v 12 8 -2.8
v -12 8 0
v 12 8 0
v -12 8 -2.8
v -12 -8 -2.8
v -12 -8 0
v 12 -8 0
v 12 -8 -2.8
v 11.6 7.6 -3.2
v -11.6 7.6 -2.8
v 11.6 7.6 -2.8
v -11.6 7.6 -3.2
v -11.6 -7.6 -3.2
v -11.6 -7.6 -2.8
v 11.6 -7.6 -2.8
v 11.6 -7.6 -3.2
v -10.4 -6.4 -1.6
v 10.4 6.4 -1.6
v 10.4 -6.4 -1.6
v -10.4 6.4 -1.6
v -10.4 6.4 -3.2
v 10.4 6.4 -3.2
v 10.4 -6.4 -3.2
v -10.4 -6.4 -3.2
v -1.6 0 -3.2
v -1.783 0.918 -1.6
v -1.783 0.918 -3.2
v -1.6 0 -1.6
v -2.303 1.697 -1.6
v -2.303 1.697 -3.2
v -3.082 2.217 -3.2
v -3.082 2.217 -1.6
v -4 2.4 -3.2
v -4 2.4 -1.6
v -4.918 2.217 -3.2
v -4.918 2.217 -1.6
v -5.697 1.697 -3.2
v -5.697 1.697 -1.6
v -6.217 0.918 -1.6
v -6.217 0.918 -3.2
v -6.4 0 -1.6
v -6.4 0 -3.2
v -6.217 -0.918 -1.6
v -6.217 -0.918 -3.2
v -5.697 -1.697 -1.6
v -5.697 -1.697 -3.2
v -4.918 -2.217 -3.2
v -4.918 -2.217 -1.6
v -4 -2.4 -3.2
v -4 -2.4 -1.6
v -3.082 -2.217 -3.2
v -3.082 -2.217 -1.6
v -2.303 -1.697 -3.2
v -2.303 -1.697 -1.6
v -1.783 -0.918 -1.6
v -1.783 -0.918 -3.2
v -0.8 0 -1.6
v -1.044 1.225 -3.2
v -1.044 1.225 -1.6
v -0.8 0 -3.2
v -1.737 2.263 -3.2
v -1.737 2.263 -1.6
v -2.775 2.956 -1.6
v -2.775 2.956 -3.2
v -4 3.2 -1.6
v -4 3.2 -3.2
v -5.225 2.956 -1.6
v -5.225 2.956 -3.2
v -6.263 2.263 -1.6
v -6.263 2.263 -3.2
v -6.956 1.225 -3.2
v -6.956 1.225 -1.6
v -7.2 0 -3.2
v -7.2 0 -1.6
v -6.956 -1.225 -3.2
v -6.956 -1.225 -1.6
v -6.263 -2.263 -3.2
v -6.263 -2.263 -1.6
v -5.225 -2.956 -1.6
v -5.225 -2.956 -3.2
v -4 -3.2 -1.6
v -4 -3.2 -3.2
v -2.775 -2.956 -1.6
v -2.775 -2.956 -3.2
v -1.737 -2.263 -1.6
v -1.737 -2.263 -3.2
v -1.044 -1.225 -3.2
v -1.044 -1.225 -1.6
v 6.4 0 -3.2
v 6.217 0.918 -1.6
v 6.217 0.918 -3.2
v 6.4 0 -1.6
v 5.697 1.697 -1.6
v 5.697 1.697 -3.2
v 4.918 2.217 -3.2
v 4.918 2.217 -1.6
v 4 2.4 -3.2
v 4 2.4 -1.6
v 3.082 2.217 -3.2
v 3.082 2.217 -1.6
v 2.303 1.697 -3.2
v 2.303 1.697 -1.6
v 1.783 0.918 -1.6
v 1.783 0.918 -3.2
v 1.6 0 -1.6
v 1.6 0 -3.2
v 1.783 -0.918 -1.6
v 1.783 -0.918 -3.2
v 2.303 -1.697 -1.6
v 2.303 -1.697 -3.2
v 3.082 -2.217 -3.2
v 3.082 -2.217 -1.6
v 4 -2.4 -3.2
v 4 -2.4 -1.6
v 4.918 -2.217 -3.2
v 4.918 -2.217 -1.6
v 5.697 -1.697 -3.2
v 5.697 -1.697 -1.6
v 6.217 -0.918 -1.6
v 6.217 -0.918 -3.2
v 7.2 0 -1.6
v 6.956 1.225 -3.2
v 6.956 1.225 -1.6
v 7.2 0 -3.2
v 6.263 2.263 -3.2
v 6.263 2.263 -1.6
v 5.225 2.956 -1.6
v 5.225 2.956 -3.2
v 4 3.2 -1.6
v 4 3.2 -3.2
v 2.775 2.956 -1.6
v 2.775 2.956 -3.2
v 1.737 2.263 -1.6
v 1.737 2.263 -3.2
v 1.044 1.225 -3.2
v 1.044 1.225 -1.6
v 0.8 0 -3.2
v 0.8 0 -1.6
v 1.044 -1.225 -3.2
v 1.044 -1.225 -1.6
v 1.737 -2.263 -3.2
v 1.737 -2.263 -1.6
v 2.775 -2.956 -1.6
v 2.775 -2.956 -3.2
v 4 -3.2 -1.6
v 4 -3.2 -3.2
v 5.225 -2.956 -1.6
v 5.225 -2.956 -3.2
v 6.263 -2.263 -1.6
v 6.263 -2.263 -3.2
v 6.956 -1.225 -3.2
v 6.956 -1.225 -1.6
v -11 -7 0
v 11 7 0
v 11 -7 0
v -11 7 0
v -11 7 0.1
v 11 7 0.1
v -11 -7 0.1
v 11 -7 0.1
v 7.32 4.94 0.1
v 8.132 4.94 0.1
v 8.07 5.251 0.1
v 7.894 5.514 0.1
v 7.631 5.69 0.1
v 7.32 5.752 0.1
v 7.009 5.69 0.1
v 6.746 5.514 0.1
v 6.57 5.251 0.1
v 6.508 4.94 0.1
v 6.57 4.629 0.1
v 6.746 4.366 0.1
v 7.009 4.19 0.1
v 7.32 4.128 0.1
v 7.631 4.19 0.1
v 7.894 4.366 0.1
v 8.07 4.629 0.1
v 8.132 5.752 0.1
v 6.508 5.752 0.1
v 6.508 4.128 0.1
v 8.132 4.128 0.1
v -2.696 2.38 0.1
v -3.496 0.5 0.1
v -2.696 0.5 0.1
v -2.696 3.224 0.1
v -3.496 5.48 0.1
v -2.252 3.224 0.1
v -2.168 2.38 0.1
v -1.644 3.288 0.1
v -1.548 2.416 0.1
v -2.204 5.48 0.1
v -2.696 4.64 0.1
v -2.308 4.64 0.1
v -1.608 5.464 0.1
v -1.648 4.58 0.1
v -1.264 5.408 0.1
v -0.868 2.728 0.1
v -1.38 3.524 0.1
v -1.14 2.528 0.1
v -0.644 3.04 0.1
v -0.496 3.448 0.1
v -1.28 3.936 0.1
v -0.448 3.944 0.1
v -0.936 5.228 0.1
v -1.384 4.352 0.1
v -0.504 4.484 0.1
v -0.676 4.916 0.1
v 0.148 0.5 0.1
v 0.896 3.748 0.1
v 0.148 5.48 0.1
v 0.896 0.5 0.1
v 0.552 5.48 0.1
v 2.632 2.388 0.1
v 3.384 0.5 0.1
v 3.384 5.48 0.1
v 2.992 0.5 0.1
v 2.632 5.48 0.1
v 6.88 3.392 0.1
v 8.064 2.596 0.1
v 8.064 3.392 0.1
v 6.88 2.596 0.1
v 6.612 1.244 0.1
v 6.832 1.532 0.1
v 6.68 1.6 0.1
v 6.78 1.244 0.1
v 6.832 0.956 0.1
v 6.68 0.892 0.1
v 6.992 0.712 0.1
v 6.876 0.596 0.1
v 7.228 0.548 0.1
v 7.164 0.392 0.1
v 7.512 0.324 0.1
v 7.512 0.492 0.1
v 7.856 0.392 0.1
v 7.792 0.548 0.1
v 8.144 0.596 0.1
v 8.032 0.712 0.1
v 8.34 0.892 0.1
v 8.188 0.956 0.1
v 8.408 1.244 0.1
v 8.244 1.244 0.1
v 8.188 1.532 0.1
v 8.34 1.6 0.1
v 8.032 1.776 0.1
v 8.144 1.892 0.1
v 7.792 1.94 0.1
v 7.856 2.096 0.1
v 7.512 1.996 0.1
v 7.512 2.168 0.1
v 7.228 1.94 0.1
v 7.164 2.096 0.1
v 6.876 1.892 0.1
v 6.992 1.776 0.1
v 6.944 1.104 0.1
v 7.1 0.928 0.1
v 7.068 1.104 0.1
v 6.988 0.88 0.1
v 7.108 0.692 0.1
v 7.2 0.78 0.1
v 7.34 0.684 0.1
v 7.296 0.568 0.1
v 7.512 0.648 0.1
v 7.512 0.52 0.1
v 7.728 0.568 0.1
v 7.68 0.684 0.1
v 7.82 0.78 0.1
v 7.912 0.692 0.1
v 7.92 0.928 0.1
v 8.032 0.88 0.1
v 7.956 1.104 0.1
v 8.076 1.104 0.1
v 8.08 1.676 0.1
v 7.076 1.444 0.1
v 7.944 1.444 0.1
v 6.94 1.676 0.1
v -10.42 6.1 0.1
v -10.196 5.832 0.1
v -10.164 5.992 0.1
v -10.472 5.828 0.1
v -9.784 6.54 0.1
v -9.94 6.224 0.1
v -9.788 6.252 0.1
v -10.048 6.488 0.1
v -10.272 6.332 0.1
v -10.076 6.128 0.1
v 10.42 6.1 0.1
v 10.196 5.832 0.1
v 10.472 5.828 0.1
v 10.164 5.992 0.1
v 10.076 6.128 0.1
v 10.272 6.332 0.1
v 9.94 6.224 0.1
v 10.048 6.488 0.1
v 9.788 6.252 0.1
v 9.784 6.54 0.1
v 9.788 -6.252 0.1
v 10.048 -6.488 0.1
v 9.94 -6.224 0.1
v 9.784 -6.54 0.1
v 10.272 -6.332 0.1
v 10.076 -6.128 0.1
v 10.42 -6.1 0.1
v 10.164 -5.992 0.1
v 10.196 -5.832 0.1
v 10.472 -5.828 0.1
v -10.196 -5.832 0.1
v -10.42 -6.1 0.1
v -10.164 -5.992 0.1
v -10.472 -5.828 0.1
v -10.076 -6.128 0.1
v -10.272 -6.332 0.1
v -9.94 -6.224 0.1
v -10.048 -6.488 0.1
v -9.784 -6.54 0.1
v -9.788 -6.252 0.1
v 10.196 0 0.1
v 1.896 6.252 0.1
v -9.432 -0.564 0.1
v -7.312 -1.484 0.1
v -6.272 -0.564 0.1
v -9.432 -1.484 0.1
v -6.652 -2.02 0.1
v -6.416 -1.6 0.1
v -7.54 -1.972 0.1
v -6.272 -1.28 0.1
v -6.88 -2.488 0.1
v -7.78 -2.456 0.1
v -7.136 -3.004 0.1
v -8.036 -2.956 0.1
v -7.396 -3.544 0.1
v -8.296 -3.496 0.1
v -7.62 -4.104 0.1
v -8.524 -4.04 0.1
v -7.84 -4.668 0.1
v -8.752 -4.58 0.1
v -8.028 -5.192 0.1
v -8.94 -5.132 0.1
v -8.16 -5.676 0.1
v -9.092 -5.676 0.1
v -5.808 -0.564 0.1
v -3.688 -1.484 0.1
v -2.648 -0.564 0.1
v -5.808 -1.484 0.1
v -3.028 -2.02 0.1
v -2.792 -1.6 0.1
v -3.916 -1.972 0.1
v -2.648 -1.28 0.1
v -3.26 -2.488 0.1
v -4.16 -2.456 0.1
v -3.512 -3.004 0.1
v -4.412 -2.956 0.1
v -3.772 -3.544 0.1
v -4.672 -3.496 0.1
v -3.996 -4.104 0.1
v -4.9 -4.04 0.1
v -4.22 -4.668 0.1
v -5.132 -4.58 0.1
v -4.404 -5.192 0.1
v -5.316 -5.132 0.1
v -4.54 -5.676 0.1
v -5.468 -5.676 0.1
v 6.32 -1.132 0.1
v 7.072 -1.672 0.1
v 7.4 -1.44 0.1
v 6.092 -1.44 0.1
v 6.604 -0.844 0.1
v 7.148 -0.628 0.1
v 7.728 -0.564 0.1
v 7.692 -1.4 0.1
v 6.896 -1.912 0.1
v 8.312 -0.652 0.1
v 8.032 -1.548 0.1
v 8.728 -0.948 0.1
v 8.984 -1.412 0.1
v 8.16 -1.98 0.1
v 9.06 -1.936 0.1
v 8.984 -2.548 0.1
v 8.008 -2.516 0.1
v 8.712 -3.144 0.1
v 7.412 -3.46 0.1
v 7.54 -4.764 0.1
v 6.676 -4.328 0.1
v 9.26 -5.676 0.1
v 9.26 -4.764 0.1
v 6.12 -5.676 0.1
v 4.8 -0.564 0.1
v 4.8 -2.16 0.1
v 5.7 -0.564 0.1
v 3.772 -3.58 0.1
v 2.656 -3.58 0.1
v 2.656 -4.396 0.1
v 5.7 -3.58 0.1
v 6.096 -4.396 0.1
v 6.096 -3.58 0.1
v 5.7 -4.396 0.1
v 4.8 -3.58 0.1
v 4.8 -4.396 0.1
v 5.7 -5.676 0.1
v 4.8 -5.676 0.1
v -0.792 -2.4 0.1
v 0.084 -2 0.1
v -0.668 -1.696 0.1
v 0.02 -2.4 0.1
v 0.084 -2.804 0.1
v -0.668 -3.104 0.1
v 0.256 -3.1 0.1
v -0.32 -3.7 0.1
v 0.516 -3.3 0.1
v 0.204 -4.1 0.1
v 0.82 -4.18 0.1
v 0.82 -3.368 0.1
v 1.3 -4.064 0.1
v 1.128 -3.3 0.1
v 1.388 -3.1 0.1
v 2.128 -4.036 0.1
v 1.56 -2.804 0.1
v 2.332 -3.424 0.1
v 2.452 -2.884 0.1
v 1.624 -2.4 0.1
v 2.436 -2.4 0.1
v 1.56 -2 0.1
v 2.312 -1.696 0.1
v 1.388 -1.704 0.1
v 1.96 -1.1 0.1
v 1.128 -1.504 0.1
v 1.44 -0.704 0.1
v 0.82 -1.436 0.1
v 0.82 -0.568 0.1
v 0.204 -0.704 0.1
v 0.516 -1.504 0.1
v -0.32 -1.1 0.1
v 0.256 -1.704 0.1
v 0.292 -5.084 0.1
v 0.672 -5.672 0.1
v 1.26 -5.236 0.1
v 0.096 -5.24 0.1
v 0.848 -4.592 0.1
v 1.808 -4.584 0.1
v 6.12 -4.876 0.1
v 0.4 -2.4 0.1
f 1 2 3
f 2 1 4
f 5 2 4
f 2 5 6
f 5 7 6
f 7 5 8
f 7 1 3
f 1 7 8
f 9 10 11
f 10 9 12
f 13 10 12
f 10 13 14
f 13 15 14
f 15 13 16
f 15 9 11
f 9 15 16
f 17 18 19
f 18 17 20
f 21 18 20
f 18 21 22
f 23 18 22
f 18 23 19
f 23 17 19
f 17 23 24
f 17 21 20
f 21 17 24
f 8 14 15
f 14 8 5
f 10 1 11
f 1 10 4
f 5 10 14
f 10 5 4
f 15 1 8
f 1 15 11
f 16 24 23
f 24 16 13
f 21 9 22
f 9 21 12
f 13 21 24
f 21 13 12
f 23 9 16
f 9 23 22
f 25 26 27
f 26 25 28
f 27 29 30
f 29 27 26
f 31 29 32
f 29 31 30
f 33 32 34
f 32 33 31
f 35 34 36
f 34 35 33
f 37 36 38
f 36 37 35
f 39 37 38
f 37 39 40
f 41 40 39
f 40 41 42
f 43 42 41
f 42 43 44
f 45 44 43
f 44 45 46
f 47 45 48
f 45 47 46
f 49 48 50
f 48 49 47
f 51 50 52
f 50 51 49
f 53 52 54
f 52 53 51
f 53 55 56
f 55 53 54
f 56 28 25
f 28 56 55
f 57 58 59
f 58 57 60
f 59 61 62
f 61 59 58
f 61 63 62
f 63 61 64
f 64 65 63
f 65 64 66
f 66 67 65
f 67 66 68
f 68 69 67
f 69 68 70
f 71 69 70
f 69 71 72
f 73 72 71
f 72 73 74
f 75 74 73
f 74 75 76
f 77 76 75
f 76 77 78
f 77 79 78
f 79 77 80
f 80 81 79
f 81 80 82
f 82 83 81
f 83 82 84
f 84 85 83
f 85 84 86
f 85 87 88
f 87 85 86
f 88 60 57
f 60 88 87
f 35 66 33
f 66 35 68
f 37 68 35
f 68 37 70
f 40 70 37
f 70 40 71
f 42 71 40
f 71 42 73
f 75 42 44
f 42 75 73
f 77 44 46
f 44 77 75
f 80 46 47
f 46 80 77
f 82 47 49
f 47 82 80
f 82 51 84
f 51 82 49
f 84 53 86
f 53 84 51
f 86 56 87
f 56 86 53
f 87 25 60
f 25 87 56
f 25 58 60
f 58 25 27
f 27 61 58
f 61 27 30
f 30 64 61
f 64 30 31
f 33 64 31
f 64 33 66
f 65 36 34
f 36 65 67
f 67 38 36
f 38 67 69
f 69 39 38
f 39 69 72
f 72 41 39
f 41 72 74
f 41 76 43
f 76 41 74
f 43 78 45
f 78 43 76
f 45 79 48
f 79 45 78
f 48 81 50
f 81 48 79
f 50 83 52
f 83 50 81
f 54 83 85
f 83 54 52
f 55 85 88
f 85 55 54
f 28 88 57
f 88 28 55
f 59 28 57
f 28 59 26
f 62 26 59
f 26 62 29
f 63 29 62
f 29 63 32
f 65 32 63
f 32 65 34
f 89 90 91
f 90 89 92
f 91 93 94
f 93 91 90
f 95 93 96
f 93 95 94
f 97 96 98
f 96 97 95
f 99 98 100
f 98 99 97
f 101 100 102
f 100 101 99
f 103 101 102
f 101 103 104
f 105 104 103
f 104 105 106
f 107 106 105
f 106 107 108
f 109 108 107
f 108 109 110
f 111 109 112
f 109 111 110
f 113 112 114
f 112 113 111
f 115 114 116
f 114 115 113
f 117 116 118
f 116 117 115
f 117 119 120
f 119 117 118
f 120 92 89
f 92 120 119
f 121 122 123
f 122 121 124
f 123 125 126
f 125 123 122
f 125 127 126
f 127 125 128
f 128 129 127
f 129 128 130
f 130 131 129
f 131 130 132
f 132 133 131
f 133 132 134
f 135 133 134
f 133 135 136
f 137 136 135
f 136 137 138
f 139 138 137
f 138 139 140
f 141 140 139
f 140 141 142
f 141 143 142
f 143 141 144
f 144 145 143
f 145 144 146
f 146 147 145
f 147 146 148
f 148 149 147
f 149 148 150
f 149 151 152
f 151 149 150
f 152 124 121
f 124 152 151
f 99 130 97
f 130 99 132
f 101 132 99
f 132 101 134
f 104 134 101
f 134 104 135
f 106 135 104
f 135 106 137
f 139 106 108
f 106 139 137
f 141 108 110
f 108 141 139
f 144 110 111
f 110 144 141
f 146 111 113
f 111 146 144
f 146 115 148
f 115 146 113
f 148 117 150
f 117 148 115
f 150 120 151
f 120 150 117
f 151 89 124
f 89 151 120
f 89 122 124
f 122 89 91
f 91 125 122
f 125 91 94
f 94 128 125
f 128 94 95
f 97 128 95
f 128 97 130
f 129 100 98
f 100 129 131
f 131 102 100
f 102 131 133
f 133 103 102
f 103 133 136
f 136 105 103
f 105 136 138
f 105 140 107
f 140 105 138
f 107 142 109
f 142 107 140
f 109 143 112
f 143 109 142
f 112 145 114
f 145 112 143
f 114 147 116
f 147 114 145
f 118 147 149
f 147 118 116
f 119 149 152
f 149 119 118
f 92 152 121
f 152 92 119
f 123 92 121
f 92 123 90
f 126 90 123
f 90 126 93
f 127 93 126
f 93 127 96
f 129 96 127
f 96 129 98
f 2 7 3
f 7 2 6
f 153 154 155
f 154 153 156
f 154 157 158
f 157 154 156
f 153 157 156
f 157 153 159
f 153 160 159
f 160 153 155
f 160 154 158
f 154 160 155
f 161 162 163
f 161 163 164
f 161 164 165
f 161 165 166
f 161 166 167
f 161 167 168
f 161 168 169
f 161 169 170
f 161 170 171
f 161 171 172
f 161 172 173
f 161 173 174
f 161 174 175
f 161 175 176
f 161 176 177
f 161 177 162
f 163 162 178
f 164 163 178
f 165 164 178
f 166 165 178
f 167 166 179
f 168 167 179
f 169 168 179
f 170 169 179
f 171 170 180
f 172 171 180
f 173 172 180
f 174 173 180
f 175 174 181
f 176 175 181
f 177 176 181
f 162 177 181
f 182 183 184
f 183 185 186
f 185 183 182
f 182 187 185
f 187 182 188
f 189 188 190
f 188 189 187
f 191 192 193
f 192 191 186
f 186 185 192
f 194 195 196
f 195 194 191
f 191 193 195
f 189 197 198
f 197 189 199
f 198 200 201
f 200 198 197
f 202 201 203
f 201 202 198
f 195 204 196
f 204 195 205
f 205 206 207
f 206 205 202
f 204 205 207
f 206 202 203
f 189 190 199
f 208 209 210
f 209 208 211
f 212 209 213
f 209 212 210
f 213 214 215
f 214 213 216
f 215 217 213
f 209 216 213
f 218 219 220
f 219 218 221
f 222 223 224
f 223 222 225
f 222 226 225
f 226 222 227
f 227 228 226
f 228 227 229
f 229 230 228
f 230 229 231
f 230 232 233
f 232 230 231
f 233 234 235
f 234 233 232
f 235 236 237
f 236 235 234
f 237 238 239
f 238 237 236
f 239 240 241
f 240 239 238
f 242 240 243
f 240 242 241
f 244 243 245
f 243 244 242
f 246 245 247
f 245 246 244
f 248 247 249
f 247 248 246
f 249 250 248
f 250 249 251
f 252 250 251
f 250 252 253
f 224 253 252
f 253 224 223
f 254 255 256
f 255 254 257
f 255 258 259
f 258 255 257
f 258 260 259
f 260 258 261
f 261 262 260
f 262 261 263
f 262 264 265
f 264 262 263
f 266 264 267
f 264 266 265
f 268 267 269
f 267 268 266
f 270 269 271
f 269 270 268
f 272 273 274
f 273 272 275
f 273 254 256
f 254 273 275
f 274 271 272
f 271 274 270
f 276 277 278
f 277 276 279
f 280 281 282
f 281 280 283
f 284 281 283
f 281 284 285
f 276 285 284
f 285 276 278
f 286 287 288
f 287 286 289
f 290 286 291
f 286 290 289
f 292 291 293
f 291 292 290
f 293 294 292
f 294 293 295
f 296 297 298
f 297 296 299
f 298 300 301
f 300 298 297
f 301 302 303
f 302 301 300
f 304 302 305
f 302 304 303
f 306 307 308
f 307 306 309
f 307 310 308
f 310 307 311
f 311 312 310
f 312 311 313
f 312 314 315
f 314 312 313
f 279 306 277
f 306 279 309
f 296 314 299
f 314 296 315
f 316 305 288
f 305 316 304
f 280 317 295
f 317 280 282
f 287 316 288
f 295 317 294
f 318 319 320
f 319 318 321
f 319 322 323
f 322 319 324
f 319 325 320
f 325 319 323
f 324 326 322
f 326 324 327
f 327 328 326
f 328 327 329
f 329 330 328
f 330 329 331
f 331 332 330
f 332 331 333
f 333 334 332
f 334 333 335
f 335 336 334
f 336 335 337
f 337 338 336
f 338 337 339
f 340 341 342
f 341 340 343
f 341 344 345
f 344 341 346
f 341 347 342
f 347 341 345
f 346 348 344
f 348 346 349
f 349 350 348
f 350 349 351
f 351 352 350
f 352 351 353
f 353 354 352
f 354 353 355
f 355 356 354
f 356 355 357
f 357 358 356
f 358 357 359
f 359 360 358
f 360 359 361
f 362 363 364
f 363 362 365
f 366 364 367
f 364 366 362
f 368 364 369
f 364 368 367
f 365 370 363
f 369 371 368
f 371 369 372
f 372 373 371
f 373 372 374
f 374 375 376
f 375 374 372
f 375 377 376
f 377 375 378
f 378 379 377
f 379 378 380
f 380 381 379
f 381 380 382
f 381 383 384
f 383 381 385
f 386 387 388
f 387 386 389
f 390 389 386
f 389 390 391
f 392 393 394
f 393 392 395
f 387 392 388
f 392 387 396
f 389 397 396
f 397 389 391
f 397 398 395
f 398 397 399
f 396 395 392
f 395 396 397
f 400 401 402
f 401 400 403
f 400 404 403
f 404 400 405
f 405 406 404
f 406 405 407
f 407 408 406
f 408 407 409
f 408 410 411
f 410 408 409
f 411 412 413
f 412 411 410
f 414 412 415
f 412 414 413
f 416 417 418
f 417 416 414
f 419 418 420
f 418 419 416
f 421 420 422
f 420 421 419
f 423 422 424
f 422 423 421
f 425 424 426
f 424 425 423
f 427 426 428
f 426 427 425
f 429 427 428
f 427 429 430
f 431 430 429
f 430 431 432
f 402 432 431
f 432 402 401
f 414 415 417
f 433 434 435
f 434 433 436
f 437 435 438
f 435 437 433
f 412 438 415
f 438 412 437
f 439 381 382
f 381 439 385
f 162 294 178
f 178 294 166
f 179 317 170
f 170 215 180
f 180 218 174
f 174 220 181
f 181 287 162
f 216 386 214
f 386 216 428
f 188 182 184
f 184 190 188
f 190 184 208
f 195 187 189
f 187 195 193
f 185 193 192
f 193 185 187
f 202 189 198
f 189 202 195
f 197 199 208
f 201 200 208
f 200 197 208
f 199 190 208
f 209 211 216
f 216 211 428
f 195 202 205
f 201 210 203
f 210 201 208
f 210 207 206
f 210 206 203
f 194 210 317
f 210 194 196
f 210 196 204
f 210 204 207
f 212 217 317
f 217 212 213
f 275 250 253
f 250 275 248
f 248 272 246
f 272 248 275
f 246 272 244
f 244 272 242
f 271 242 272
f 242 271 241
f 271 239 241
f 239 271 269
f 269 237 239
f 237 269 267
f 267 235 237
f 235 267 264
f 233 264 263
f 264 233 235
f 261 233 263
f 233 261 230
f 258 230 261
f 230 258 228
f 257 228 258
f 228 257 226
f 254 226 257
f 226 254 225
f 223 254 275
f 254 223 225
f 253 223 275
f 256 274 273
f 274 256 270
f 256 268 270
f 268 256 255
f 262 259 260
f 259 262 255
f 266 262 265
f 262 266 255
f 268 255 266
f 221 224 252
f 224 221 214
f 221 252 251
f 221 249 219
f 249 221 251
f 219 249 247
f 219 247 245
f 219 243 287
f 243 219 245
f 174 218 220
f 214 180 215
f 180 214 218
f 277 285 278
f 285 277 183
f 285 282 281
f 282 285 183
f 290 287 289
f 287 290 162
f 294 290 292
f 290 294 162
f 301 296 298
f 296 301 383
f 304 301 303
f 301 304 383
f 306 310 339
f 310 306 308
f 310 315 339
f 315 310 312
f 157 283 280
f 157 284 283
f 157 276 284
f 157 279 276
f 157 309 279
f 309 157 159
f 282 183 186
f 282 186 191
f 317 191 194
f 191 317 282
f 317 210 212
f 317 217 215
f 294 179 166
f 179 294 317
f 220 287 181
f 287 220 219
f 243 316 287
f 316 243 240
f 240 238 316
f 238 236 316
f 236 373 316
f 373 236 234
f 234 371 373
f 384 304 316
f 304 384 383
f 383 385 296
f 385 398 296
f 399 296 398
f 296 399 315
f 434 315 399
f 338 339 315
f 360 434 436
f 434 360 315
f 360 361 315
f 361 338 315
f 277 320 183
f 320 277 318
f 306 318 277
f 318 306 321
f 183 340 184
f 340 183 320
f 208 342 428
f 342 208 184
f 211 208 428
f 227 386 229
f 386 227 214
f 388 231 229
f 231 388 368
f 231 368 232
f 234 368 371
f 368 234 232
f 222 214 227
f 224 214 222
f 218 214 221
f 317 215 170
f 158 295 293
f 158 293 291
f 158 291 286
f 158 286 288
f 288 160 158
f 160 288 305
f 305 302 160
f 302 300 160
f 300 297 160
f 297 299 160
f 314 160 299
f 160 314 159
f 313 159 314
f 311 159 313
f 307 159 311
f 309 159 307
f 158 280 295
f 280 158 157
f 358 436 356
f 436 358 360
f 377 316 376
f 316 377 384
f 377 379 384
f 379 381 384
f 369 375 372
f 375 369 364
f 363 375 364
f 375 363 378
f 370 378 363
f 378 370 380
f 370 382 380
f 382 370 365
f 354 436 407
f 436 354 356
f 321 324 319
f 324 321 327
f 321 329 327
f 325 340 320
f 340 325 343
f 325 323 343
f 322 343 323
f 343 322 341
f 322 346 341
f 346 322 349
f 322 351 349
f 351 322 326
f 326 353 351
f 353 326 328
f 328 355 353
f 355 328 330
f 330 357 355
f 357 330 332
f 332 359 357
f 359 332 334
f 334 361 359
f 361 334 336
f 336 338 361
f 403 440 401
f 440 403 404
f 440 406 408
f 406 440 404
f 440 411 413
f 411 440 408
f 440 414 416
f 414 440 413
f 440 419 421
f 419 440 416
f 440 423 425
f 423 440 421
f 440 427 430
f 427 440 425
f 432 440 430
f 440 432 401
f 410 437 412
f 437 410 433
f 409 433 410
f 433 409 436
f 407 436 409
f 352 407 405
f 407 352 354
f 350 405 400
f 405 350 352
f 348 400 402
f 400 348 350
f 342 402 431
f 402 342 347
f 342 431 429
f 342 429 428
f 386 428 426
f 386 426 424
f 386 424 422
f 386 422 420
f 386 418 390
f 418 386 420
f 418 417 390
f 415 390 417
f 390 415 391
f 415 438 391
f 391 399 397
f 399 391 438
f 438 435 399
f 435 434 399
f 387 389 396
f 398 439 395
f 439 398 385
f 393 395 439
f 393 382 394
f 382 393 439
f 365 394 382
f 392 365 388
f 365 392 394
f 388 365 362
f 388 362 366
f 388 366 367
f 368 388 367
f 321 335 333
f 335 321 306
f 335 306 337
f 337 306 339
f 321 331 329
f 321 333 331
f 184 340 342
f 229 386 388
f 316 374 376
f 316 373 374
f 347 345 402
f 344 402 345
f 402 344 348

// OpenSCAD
use <../lib.scad>
use <26603.scad>
use <6372023n.scad>
function ldraw_lib__26603d0r() = [
// 0 Tile  2 x  3 with "PN 77 942" Licence Plate Sticker
// 0 Name: 26603d0r.dat
// 0 Author: Vincent Messenet [Cheenzo]
// 0 !LDRAW_ORG Shortcut UPDATE 2026-07
// 0 !LICENSE Licensed under CC BY 4.0 : see CAreadme.txt
// 
// 0 BFC CERTIFY CCW
  [0,"BFC","CERTIFY"],
  [0,"BFC","CCW"],
// 
// 0 !CATEGORY Sticker Shortcut
// 0 !KEYWORDS Bricklink 26603pb224, Fiat 500, set 77942
// 
// 0 !HISTORY 2026-07-30 [OrionP] Official Update 2026-07
// 
// 1 16 0 0 0 1 0 0 0 1 0 0 0 1 26603.dat
  [1,16,0,0,0,1,0,0,0,1,0,0,0,1, ldraw_lib__26603()],
// 1 16 0 0 0 1 0 0 0 1 0 0 0 1 6372023n.dat
  [1,16,0,0,0,1,0,0,0,1,0,0,0,1, ldraw_lib__6372023n()],
];
module ldraw_lib__26603d0r(step=0, col=false, unit=2/5, alt=false, line=0.2, solid=!$preview)
    makepoly(ldraw_lib__26603d0r(), step=step, col=col, unit=unit, alt=alt, line=line, solid=solid);
ldraw_lib__26603d0r(line=0.2);
